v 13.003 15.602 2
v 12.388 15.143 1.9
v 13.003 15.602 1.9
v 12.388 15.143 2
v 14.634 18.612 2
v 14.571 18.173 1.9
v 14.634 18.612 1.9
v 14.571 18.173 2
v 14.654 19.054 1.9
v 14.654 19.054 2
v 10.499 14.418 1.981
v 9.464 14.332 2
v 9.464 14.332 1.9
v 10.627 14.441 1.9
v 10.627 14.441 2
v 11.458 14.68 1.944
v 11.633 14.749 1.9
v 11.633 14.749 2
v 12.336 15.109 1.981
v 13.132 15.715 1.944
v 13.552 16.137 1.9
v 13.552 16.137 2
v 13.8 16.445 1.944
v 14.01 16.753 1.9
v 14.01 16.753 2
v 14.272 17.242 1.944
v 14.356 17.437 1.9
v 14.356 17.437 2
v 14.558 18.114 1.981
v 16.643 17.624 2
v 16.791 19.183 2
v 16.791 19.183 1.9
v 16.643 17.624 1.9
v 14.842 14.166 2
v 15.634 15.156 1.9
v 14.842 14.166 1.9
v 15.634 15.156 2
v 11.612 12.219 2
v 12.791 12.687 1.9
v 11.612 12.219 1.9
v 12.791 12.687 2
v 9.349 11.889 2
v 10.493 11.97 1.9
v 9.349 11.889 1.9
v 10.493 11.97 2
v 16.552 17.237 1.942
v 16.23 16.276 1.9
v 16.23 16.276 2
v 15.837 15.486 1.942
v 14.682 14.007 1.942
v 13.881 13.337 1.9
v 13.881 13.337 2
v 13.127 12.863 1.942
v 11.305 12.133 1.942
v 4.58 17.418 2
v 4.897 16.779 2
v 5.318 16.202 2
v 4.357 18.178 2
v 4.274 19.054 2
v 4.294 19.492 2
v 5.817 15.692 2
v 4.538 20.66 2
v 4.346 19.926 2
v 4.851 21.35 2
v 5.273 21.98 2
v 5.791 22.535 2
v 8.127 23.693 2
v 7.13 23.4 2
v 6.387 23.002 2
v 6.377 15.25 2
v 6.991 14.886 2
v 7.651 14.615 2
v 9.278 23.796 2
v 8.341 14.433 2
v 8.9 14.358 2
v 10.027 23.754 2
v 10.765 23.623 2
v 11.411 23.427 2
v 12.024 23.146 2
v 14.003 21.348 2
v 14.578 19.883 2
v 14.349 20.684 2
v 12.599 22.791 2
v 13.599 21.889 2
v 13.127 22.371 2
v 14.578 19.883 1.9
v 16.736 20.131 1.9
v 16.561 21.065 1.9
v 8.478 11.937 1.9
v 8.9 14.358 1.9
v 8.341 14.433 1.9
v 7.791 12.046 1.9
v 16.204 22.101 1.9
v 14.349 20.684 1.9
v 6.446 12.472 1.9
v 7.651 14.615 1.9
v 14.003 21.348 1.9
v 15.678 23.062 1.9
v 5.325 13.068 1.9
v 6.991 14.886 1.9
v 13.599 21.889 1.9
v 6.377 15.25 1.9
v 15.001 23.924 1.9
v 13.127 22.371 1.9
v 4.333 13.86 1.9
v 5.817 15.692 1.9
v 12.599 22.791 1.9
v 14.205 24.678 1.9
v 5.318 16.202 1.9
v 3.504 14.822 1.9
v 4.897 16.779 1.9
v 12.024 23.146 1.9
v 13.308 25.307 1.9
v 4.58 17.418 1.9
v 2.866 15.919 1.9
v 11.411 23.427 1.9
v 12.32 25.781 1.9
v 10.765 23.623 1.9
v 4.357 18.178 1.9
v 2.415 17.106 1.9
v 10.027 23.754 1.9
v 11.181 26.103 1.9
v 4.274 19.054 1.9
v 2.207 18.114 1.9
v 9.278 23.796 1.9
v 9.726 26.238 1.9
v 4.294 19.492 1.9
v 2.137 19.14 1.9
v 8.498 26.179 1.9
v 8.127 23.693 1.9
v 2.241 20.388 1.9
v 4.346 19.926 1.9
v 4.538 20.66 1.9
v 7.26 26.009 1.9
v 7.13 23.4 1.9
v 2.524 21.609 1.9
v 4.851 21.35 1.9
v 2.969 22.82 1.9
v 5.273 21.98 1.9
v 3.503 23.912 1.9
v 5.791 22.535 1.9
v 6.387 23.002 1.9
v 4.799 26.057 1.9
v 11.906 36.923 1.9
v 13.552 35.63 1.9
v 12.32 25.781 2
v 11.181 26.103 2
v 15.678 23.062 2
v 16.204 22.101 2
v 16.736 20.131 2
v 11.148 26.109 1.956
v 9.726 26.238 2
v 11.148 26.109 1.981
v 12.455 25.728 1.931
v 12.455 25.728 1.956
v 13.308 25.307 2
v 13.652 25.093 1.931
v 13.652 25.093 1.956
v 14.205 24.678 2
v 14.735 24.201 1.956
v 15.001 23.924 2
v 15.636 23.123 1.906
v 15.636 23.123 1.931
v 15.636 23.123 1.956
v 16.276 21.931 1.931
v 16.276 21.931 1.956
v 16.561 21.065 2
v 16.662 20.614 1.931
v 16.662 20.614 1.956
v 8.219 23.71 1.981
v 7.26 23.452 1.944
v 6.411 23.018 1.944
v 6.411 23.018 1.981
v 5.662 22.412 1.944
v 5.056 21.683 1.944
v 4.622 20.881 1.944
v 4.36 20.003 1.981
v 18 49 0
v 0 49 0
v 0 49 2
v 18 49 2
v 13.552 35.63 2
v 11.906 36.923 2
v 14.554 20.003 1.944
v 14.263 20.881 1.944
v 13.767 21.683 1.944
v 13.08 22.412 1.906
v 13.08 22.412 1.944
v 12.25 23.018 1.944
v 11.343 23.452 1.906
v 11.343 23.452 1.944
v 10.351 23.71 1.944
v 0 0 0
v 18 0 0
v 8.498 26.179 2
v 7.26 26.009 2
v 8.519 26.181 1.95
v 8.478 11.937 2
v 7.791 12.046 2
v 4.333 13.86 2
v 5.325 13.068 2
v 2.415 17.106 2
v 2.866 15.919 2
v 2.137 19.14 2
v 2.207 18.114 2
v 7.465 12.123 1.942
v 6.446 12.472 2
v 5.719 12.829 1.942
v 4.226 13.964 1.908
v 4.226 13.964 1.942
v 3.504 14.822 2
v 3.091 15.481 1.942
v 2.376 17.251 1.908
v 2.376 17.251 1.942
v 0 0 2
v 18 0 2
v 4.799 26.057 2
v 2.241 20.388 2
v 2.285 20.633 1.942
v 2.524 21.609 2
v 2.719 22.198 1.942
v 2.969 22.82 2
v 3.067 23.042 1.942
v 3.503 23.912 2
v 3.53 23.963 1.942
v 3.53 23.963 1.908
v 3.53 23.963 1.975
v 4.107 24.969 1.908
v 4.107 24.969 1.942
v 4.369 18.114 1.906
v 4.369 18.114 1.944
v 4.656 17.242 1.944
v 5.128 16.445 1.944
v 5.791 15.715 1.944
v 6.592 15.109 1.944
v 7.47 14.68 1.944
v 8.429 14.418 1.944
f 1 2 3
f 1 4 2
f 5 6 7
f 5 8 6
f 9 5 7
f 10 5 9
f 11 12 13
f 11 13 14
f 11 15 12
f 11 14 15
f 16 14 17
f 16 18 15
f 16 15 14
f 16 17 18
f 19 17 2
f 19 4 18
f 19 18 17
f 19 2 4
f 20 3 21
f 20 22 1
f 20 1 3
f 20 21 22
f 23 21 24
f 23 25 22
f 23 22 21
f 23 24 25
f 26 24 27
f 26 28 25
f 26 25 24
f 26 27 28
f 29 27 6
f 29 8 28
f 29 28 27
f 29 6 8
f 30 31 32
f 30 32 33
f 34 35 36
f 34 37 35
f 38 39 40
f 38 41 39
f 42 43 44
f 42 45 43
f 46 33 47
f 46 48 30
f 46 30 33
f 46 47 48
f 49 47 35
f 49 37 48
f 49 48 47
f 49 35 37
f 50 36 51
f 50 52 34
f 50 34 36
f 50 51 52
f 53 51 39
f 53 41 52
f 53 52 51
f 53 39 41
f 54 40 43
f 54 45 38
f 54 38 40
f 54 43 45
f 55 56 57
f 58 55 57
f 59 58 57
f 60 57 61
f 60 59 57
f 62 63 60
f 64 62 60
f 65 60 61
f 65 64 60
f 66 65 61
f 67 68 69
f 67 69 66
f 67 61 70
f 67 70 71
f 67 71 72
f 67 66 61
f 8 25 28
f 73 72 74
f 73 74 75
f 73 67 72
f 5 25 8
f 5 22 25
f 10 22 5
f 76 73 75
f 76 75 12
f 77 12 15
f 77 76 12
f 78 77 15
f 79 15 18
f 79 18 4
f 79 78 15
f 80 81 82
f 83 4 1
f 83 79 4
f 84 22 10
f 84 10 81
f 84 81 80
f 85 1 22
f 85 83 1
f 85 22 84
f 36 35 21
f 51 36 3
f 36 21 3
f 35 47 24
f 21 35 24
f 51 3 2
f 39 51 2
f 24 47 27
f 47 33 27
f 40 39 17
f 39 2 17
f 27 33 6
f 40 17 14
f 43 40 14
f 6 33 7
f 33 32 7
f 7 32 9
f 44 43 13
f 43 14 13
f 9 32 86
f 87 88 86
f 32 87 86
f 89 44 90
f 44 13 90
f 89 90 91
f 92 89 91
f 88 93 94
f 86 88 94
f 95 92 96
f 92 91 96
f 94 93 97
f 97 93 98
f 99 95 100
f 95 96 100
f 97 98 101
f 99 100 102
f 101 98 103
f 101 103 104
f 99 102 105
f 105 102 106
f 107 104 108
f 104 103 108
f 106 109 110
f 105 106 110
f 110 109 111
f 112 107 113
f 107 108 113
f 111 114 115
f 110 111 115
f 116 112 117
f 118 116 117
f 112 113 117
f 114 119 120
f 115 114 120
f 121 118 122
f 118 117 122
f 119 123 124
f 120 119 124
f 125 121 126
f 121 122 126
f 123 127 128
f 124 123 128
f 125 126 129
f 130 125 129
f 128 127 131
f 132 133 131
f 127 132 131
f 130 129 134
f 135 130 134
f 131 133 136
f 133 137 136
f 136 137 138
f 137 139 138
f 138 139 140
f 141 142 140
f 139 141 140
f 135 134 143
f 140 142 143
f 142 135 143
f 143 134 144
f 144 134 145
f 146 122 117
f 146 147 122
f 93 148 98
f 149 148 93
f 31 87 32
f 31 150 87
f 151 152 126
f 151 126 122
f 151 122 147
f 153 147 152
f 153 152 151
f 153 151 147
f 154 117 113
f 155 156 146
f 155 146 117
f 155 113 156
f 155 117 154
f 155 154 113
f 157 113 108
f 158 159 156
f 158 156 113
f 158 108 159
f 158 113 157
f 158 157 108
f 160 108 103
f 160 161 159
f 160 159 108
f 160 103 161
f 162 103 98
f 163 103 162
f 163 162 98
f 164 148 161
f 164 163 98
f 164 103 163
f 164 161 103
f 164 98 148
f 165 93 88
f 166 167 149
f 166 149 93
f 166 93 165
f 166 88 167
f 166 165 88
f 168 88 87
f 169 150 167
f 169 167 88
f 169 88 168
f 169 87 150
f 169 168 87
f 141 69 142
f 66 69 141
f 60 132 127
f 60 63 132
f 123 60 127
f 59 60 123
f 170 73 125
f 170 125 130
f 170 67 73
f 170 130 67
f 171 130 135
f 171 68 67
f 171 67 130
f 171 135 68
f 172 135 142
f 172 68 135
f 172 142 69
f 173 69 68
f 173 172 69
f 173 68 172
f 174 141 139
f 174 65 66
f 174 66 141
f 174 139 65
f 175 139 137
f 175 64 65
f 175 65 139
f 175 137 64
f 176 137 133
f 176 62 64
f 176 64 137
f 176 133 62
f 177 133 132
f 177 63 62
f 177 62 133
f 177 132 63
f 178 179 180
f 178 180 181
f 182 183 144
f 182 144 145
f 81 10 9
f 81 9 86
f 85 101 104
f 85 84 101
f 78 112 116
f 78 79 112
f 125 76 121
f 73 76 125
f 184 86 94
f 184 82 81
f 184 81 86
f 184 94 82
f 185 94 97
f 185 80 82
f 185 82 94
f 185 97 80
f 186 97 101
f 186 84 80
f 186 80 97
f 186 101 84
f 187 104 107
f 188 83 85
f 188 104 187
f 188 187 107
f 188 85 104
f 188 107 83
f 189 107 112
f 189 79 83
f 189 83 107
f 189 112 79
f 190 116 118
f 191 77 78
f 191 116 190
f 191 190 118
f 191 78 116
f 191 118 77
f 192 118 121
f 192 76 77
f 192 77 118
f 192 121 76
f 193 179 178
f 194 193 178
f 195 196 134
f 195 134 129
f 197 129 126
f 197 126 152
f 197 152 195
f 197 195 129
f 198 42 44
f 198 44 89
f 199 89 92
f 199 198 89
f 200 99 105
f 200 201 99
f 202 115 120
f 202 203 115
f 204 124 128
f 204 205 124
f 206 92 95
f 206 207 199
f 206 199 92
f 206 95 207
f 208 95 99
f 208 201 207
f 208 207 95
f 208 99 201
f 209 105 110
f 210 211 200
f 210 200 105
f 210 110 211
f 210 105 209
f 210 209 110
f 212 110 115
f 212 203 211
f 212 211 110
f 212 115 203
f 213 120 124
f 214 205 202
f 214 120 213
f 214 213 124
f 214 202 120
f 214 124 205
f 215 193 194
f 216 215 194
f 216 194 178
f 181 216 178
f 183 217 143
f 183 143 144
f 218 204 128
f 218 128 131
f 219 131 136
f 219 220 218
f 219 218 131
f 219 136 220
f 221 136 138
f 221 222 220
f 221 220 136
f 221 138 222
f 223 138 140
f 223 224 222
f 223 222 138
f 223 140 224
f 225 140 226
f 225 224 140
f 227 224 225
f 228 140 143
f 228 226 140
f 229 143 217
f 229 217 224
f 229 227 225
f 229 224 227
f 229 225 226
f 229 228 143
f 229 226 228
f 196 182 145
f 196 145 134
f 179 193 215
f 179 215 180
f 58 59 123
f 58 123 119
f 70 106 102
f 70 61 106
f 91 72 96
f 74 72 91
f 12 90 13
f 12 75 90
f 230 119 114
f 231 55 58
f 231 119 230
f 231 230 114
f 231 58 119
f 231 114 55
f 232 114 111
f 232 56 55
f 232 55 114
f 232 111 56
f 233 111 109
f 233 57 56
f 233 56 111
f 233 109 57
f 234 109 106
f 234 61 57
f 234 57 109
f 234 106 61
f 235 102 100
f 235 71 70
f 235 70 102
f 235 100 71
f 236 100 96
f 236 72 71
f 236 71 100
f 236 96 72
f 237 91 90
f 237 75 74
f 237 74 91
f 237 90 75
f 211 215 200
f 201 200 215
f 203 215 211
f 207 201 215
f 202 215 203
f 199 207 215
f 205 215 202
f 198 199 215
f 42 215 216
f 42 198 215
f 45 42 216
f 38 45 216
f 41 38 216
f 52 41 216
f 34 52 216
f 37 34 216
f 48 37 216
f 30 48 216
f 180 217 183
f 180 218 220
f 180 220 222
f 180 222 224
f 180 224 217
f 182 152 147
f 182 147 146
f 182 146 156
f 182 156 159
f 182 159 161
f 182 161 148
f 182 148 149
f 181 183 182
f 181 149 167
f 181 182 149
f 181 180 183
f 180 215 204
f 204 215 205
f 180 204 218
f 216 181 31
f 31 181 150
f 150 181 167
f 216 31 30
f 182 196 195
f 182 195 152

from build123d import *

# Parameters (mm, degrees)
SKETCH_1_W          = 18
SKETCH_1_H          = 49
EXTRUDE_1_DEPTH     = 2
CUT_EXTRUDE_1_DEPTH = 0.1


with BuildPart() as part:
    # ｽｹｯﾁ1 → ﾎﾞｽ - 押し出し1 (new body)
    with BuildSketch(Plane.XY):
        with Locations((9, 24.5)):
            Rectangle(SKETCH_1_W, SKETCH_1_H)
    extrude(amount=EXTRUDE_1_DEPTH)

    # ｽｹｯﾁ2 → ｶｯﾄ - 押し出し1 (cut)
    with BuildSketch(Plane.XY.offset(2)):
        with BuildLine():
            Line((11.90625, 36.923076923), (13.551945613, 35.630371094))
            Line((13.551945613, 35.630371094), (7.260141226, 26.009014423))
            add(Edge.make_bspline(
                [(7.260141226, 26.009014423), (7.679039003, 26.075783725), (8.496146481, 26.206024798), (9.323228755, 26.227510105), (9.726299579, 26.237980769)],
                knots=[0, 0, 0, 0, 1.025318673, 2, 2, 2, 2], degree=3))
            add(Edge.make_bspline(
                [(9.726299579, 26.237980769), (9.968319599, 26.231475795), (10.444728806, 26.218670947), (11.144182228, 26.120129034), (11.81629981, 25.964836755), (12.458295779, 25.738466585), (13.072474459, 25.449298781), (13.662360404, 25.102732539), (14.216865151, 24.680872463), (14.743129424, 24.209623389), (15.220924498, 23.687673905), (15.643943733, 23.133854097), (15.999272441, 22.54874096), (16.287566443, 21.932630854), (16.511437135, 21.286473499), (16.674638792, 20.611095621), (16.771110664, 19.906031503), (16.784210878, 19.426528203), (16.790865385, 19.182955228)],
                knots=[0, 0, 0, 0, 1.04369286, 2.054478336, 3.041073146, 4.015093852, 4.984733326, 5.965804835, 6.960378782, 7.985147595, 9.009457201, 10.008161701, 10.986880575, 11.956520048, 12.937015923, 13.931873656, 14.949455224, 16, 16, 16, 16], degree=3))
            add(Edge.make_bspline(
                [(16.790865385, 19.182955228), (16.781183189, 18.849718314), (16.762130919, 18.19398693), (16.57228545, 17.238923981), (16.277285009, 16.329065259), (15.855616468, 15.478937432), (15.331861327, 14.689705664), (14.693158419, 13.990397408), (13.962158972, 13.366713762), (13.135614863, 12.845174977), (12.246095768, 12.419250648), (11.311611643, 12.113326412), (10.341237665, 11.924979951), (9.682620599, 11.901367457), (9.349459135, 11.889423077)],
                knots=[0, 0, 0, 0, 1.031375318, 2.029502543, 3.004789286, 3.987476834, 4.960371455, 5.9300674, 6.912260825, 7.929083631, 8.949397511, 9.960523116, 10.96833055, 12, 12, 12, 12], degree=3))
            add(Edge.make_bspline(
                [(9.349459135, 11.889423077), (9.029033368, 11.899820334), (8.394326026, 11.920415479), (7.460652908, 12.103880164), (6.56351345, 12.40124456), (5.709193198, 12.810916705), (4.917797599, 13.328381944), (4.209779609, 13.95133245), (3.5886695, 14.666452204), (3.071770739, 15.473630281), (2.661796152, 16.341017313), (2.354343269, 17.245464752), (2.174754543, 18.183677128), (2.149659183, 18.819682735), (2.137019231, 19.140024038)],
                knots=[0, 0, 0, 0, 1.012016664, 2.004627821, 2.994792927, 3.992885782, 4.990978636, 5.973936114, 6.964471063, 7.975201453, 8.993600317, 9.990122807, 10.98767138, 12, 12, 12, 12], degree=3))
            add(Edge.make_bspline(
                [(2.137019231, 19.140024038), (2.145057276, 19.385255935), (2.161469429, 19.885972612), (2.276064639, 20.644326088), (2.460201903, 21.420280769), (2.666419829, 22.078554836), (2.884308355, 22.617816262), (3.065640812, 23.052588225), (3.291342463, 23.499998384), (3.532007789, 23.975388657), (3.809300058, 24.466507405), (4.110804744, 24.981562727), (4.444857726, 25.512363271), (4.679037762, 25.872572885), (4.798753005, 26.056715745)],
                knots=[0, 0, 0, 0, 1.173818275, 2.396712641, 3.66331629, 4.989737886, 5.693666774, 6.447286557, 7.243889047, 8.091586357, 8.998013824, 9.943181721, 10.948533338, 12, 12, 12, 12], degree=3))
            Line((4.798753005, 26.056715745), (11.90625, 36.923076923))
        make_face()
        with BuildLine():
            add(Edge.make_bspline(
                [(9.277907151, 23.795673077), (9.096508664, 23.790379601), (8.742184724, 23.780039905), (8.22234142, 23.719996673), (7.730353048, 23.606927674), (7.259701478, 23.462921022), (6.819185857, 23.264916277), (6.405604643, 23.024397787), (6.017358486, 22.741225129), (5.658513965, 22.419410002), (5.333169469, 22.06706642), (5.052990705, 21.689675564), (4.811311518, 21.296332503), (4.614812001, 20.883750718), (4.461799164, 20.452087926), (4.351116957, 20.003329462), (4.289519114, 19.534466057), (4.27927136, 19.216518137), (4.274038462, 19.054161659)],
                knots=[0, 0, 0, 0, 1.129588631, 2.206414736, 3.251139165, 4.268635594, 5.265702196, 6.250456724, 7.242448911, 8.251968645, 9.246821453, 10.222880186, 11.173611482, 12.116736599, 13.062300278, 14.020270554, 14.989073742, 16, 16, 16, 16], degree=3))
            add(Edge.make_bspline(
                [(4.274038462, 19.054161659), (4.278299957, 18.893257331), (4.286656114, 18.577747899), (4.362531719, 18.11279741), (4.478431118, 17.665361158), (4.650836312, 17.237745816), (4.856487104, 16.823433367), (5.127985828, 16.437430799), (5.428817888, 16.056294251), (5.7884134, 15.709302097), (6.174334852, 15.386427565), (6.586639462, 15.104213697), (7.01635276, 14.862780982), (7.469276185, 14.673566193), (7.938983762, 14.518279527), (8.42938896, 14.409004105), (8.940832852, 14.347224098), (9.287283894, 14.336962995), (9.463942308, 14.331730769)],
                knots=[0, 0, 0, 0, 0.989467248, 1.94019797, 2.891935182, 3.827694429, 4.772920941, 5.730924762, 6.725747692, 7.756678648, 8.79901574, 9.819492441, 10.826891316, 11.826466727, 12.835195252, 13.867842842, 14.912794438, 16, 16, 16, 16], degree=3))
            add(Edge.make_bspline(
                [(9.463942308, 14.331730769), (9.640600432, 14.336963405), (9.987050907, 14.347225313), (10.498498913, 14.408999488), (10.988888902, 14.518296468), (11.458651755, 14.67350478), (11.911371134, 14.863008803), (12.340708615, 15.102711685), (12.749114037, 15.388163129), (13.13528883, 15.708750328), (13.493387589, 16.058269196), (13.80143479, 16.434028557), (14.064618931, 16.826553095), (14.278483668, 17.236113739), (14.448989953, 17.665619717), (14.565477078, 18.112728143), (14.64119599, 18.577766034), (14.649573678, 18.893263456), (14.653846154, 19.054161659)],
                knots=[0, 0, 0, 0, 1.087397944, 2.132534446, 3.165364764, 4.174271784, 5.174024072, 6.181601208, 7.194203697, 8.236725232, 9.267838612, 10.269026844, 11.221737037, 12.171628256, 13.107553087, 14.05945871, 15.010357665, 16, 16, 16, 16], degree=3))
            add(Edge.make_bspline(
                [(14.653846154, 19.054161659), (14.650102196, 19.216729943), (14.642754025, 19.535798614), (14.559641946, 20.003119731), (14.444373295, 20.454368009), (14.270317319, 20.886707412), (14.044190112, 21.298431846), (13.768758361, 21.69162113), (13.450129624, 22.069289743), (13.082073149, 22.420100993), (12.681409236, 22.740869506), (12.255399628, 23.02403113), (11.80971145, 23.263006418), (11.344796592, 23.462399382), (10.855328051, 23.60629134), (10.349208064, 23.719592868), (9.819963396, 23.779886239), (9.460893971, 23.790343772), (9.277907151, 23.795673077)],
                knots=[0, 0, 0, 0, 0.978206639, 1.919901502, 2.851605144, 3.780102724, 4.718870031, 5.675451981, 6.667674623, 7.690630536, 8.733308323, 9.756129687, 10.767539656, 11.776269907, 12.797430371, 13.836405707, 14.897401972, 16, 16, 16, 16], degree=3))
        make_face(mode=Mode.SUBTRACT)
    extrude(amount=-CUT_EXTRUDE_1_DEPTH, mode=Mode.SUBTRACT)


solid = part.part
